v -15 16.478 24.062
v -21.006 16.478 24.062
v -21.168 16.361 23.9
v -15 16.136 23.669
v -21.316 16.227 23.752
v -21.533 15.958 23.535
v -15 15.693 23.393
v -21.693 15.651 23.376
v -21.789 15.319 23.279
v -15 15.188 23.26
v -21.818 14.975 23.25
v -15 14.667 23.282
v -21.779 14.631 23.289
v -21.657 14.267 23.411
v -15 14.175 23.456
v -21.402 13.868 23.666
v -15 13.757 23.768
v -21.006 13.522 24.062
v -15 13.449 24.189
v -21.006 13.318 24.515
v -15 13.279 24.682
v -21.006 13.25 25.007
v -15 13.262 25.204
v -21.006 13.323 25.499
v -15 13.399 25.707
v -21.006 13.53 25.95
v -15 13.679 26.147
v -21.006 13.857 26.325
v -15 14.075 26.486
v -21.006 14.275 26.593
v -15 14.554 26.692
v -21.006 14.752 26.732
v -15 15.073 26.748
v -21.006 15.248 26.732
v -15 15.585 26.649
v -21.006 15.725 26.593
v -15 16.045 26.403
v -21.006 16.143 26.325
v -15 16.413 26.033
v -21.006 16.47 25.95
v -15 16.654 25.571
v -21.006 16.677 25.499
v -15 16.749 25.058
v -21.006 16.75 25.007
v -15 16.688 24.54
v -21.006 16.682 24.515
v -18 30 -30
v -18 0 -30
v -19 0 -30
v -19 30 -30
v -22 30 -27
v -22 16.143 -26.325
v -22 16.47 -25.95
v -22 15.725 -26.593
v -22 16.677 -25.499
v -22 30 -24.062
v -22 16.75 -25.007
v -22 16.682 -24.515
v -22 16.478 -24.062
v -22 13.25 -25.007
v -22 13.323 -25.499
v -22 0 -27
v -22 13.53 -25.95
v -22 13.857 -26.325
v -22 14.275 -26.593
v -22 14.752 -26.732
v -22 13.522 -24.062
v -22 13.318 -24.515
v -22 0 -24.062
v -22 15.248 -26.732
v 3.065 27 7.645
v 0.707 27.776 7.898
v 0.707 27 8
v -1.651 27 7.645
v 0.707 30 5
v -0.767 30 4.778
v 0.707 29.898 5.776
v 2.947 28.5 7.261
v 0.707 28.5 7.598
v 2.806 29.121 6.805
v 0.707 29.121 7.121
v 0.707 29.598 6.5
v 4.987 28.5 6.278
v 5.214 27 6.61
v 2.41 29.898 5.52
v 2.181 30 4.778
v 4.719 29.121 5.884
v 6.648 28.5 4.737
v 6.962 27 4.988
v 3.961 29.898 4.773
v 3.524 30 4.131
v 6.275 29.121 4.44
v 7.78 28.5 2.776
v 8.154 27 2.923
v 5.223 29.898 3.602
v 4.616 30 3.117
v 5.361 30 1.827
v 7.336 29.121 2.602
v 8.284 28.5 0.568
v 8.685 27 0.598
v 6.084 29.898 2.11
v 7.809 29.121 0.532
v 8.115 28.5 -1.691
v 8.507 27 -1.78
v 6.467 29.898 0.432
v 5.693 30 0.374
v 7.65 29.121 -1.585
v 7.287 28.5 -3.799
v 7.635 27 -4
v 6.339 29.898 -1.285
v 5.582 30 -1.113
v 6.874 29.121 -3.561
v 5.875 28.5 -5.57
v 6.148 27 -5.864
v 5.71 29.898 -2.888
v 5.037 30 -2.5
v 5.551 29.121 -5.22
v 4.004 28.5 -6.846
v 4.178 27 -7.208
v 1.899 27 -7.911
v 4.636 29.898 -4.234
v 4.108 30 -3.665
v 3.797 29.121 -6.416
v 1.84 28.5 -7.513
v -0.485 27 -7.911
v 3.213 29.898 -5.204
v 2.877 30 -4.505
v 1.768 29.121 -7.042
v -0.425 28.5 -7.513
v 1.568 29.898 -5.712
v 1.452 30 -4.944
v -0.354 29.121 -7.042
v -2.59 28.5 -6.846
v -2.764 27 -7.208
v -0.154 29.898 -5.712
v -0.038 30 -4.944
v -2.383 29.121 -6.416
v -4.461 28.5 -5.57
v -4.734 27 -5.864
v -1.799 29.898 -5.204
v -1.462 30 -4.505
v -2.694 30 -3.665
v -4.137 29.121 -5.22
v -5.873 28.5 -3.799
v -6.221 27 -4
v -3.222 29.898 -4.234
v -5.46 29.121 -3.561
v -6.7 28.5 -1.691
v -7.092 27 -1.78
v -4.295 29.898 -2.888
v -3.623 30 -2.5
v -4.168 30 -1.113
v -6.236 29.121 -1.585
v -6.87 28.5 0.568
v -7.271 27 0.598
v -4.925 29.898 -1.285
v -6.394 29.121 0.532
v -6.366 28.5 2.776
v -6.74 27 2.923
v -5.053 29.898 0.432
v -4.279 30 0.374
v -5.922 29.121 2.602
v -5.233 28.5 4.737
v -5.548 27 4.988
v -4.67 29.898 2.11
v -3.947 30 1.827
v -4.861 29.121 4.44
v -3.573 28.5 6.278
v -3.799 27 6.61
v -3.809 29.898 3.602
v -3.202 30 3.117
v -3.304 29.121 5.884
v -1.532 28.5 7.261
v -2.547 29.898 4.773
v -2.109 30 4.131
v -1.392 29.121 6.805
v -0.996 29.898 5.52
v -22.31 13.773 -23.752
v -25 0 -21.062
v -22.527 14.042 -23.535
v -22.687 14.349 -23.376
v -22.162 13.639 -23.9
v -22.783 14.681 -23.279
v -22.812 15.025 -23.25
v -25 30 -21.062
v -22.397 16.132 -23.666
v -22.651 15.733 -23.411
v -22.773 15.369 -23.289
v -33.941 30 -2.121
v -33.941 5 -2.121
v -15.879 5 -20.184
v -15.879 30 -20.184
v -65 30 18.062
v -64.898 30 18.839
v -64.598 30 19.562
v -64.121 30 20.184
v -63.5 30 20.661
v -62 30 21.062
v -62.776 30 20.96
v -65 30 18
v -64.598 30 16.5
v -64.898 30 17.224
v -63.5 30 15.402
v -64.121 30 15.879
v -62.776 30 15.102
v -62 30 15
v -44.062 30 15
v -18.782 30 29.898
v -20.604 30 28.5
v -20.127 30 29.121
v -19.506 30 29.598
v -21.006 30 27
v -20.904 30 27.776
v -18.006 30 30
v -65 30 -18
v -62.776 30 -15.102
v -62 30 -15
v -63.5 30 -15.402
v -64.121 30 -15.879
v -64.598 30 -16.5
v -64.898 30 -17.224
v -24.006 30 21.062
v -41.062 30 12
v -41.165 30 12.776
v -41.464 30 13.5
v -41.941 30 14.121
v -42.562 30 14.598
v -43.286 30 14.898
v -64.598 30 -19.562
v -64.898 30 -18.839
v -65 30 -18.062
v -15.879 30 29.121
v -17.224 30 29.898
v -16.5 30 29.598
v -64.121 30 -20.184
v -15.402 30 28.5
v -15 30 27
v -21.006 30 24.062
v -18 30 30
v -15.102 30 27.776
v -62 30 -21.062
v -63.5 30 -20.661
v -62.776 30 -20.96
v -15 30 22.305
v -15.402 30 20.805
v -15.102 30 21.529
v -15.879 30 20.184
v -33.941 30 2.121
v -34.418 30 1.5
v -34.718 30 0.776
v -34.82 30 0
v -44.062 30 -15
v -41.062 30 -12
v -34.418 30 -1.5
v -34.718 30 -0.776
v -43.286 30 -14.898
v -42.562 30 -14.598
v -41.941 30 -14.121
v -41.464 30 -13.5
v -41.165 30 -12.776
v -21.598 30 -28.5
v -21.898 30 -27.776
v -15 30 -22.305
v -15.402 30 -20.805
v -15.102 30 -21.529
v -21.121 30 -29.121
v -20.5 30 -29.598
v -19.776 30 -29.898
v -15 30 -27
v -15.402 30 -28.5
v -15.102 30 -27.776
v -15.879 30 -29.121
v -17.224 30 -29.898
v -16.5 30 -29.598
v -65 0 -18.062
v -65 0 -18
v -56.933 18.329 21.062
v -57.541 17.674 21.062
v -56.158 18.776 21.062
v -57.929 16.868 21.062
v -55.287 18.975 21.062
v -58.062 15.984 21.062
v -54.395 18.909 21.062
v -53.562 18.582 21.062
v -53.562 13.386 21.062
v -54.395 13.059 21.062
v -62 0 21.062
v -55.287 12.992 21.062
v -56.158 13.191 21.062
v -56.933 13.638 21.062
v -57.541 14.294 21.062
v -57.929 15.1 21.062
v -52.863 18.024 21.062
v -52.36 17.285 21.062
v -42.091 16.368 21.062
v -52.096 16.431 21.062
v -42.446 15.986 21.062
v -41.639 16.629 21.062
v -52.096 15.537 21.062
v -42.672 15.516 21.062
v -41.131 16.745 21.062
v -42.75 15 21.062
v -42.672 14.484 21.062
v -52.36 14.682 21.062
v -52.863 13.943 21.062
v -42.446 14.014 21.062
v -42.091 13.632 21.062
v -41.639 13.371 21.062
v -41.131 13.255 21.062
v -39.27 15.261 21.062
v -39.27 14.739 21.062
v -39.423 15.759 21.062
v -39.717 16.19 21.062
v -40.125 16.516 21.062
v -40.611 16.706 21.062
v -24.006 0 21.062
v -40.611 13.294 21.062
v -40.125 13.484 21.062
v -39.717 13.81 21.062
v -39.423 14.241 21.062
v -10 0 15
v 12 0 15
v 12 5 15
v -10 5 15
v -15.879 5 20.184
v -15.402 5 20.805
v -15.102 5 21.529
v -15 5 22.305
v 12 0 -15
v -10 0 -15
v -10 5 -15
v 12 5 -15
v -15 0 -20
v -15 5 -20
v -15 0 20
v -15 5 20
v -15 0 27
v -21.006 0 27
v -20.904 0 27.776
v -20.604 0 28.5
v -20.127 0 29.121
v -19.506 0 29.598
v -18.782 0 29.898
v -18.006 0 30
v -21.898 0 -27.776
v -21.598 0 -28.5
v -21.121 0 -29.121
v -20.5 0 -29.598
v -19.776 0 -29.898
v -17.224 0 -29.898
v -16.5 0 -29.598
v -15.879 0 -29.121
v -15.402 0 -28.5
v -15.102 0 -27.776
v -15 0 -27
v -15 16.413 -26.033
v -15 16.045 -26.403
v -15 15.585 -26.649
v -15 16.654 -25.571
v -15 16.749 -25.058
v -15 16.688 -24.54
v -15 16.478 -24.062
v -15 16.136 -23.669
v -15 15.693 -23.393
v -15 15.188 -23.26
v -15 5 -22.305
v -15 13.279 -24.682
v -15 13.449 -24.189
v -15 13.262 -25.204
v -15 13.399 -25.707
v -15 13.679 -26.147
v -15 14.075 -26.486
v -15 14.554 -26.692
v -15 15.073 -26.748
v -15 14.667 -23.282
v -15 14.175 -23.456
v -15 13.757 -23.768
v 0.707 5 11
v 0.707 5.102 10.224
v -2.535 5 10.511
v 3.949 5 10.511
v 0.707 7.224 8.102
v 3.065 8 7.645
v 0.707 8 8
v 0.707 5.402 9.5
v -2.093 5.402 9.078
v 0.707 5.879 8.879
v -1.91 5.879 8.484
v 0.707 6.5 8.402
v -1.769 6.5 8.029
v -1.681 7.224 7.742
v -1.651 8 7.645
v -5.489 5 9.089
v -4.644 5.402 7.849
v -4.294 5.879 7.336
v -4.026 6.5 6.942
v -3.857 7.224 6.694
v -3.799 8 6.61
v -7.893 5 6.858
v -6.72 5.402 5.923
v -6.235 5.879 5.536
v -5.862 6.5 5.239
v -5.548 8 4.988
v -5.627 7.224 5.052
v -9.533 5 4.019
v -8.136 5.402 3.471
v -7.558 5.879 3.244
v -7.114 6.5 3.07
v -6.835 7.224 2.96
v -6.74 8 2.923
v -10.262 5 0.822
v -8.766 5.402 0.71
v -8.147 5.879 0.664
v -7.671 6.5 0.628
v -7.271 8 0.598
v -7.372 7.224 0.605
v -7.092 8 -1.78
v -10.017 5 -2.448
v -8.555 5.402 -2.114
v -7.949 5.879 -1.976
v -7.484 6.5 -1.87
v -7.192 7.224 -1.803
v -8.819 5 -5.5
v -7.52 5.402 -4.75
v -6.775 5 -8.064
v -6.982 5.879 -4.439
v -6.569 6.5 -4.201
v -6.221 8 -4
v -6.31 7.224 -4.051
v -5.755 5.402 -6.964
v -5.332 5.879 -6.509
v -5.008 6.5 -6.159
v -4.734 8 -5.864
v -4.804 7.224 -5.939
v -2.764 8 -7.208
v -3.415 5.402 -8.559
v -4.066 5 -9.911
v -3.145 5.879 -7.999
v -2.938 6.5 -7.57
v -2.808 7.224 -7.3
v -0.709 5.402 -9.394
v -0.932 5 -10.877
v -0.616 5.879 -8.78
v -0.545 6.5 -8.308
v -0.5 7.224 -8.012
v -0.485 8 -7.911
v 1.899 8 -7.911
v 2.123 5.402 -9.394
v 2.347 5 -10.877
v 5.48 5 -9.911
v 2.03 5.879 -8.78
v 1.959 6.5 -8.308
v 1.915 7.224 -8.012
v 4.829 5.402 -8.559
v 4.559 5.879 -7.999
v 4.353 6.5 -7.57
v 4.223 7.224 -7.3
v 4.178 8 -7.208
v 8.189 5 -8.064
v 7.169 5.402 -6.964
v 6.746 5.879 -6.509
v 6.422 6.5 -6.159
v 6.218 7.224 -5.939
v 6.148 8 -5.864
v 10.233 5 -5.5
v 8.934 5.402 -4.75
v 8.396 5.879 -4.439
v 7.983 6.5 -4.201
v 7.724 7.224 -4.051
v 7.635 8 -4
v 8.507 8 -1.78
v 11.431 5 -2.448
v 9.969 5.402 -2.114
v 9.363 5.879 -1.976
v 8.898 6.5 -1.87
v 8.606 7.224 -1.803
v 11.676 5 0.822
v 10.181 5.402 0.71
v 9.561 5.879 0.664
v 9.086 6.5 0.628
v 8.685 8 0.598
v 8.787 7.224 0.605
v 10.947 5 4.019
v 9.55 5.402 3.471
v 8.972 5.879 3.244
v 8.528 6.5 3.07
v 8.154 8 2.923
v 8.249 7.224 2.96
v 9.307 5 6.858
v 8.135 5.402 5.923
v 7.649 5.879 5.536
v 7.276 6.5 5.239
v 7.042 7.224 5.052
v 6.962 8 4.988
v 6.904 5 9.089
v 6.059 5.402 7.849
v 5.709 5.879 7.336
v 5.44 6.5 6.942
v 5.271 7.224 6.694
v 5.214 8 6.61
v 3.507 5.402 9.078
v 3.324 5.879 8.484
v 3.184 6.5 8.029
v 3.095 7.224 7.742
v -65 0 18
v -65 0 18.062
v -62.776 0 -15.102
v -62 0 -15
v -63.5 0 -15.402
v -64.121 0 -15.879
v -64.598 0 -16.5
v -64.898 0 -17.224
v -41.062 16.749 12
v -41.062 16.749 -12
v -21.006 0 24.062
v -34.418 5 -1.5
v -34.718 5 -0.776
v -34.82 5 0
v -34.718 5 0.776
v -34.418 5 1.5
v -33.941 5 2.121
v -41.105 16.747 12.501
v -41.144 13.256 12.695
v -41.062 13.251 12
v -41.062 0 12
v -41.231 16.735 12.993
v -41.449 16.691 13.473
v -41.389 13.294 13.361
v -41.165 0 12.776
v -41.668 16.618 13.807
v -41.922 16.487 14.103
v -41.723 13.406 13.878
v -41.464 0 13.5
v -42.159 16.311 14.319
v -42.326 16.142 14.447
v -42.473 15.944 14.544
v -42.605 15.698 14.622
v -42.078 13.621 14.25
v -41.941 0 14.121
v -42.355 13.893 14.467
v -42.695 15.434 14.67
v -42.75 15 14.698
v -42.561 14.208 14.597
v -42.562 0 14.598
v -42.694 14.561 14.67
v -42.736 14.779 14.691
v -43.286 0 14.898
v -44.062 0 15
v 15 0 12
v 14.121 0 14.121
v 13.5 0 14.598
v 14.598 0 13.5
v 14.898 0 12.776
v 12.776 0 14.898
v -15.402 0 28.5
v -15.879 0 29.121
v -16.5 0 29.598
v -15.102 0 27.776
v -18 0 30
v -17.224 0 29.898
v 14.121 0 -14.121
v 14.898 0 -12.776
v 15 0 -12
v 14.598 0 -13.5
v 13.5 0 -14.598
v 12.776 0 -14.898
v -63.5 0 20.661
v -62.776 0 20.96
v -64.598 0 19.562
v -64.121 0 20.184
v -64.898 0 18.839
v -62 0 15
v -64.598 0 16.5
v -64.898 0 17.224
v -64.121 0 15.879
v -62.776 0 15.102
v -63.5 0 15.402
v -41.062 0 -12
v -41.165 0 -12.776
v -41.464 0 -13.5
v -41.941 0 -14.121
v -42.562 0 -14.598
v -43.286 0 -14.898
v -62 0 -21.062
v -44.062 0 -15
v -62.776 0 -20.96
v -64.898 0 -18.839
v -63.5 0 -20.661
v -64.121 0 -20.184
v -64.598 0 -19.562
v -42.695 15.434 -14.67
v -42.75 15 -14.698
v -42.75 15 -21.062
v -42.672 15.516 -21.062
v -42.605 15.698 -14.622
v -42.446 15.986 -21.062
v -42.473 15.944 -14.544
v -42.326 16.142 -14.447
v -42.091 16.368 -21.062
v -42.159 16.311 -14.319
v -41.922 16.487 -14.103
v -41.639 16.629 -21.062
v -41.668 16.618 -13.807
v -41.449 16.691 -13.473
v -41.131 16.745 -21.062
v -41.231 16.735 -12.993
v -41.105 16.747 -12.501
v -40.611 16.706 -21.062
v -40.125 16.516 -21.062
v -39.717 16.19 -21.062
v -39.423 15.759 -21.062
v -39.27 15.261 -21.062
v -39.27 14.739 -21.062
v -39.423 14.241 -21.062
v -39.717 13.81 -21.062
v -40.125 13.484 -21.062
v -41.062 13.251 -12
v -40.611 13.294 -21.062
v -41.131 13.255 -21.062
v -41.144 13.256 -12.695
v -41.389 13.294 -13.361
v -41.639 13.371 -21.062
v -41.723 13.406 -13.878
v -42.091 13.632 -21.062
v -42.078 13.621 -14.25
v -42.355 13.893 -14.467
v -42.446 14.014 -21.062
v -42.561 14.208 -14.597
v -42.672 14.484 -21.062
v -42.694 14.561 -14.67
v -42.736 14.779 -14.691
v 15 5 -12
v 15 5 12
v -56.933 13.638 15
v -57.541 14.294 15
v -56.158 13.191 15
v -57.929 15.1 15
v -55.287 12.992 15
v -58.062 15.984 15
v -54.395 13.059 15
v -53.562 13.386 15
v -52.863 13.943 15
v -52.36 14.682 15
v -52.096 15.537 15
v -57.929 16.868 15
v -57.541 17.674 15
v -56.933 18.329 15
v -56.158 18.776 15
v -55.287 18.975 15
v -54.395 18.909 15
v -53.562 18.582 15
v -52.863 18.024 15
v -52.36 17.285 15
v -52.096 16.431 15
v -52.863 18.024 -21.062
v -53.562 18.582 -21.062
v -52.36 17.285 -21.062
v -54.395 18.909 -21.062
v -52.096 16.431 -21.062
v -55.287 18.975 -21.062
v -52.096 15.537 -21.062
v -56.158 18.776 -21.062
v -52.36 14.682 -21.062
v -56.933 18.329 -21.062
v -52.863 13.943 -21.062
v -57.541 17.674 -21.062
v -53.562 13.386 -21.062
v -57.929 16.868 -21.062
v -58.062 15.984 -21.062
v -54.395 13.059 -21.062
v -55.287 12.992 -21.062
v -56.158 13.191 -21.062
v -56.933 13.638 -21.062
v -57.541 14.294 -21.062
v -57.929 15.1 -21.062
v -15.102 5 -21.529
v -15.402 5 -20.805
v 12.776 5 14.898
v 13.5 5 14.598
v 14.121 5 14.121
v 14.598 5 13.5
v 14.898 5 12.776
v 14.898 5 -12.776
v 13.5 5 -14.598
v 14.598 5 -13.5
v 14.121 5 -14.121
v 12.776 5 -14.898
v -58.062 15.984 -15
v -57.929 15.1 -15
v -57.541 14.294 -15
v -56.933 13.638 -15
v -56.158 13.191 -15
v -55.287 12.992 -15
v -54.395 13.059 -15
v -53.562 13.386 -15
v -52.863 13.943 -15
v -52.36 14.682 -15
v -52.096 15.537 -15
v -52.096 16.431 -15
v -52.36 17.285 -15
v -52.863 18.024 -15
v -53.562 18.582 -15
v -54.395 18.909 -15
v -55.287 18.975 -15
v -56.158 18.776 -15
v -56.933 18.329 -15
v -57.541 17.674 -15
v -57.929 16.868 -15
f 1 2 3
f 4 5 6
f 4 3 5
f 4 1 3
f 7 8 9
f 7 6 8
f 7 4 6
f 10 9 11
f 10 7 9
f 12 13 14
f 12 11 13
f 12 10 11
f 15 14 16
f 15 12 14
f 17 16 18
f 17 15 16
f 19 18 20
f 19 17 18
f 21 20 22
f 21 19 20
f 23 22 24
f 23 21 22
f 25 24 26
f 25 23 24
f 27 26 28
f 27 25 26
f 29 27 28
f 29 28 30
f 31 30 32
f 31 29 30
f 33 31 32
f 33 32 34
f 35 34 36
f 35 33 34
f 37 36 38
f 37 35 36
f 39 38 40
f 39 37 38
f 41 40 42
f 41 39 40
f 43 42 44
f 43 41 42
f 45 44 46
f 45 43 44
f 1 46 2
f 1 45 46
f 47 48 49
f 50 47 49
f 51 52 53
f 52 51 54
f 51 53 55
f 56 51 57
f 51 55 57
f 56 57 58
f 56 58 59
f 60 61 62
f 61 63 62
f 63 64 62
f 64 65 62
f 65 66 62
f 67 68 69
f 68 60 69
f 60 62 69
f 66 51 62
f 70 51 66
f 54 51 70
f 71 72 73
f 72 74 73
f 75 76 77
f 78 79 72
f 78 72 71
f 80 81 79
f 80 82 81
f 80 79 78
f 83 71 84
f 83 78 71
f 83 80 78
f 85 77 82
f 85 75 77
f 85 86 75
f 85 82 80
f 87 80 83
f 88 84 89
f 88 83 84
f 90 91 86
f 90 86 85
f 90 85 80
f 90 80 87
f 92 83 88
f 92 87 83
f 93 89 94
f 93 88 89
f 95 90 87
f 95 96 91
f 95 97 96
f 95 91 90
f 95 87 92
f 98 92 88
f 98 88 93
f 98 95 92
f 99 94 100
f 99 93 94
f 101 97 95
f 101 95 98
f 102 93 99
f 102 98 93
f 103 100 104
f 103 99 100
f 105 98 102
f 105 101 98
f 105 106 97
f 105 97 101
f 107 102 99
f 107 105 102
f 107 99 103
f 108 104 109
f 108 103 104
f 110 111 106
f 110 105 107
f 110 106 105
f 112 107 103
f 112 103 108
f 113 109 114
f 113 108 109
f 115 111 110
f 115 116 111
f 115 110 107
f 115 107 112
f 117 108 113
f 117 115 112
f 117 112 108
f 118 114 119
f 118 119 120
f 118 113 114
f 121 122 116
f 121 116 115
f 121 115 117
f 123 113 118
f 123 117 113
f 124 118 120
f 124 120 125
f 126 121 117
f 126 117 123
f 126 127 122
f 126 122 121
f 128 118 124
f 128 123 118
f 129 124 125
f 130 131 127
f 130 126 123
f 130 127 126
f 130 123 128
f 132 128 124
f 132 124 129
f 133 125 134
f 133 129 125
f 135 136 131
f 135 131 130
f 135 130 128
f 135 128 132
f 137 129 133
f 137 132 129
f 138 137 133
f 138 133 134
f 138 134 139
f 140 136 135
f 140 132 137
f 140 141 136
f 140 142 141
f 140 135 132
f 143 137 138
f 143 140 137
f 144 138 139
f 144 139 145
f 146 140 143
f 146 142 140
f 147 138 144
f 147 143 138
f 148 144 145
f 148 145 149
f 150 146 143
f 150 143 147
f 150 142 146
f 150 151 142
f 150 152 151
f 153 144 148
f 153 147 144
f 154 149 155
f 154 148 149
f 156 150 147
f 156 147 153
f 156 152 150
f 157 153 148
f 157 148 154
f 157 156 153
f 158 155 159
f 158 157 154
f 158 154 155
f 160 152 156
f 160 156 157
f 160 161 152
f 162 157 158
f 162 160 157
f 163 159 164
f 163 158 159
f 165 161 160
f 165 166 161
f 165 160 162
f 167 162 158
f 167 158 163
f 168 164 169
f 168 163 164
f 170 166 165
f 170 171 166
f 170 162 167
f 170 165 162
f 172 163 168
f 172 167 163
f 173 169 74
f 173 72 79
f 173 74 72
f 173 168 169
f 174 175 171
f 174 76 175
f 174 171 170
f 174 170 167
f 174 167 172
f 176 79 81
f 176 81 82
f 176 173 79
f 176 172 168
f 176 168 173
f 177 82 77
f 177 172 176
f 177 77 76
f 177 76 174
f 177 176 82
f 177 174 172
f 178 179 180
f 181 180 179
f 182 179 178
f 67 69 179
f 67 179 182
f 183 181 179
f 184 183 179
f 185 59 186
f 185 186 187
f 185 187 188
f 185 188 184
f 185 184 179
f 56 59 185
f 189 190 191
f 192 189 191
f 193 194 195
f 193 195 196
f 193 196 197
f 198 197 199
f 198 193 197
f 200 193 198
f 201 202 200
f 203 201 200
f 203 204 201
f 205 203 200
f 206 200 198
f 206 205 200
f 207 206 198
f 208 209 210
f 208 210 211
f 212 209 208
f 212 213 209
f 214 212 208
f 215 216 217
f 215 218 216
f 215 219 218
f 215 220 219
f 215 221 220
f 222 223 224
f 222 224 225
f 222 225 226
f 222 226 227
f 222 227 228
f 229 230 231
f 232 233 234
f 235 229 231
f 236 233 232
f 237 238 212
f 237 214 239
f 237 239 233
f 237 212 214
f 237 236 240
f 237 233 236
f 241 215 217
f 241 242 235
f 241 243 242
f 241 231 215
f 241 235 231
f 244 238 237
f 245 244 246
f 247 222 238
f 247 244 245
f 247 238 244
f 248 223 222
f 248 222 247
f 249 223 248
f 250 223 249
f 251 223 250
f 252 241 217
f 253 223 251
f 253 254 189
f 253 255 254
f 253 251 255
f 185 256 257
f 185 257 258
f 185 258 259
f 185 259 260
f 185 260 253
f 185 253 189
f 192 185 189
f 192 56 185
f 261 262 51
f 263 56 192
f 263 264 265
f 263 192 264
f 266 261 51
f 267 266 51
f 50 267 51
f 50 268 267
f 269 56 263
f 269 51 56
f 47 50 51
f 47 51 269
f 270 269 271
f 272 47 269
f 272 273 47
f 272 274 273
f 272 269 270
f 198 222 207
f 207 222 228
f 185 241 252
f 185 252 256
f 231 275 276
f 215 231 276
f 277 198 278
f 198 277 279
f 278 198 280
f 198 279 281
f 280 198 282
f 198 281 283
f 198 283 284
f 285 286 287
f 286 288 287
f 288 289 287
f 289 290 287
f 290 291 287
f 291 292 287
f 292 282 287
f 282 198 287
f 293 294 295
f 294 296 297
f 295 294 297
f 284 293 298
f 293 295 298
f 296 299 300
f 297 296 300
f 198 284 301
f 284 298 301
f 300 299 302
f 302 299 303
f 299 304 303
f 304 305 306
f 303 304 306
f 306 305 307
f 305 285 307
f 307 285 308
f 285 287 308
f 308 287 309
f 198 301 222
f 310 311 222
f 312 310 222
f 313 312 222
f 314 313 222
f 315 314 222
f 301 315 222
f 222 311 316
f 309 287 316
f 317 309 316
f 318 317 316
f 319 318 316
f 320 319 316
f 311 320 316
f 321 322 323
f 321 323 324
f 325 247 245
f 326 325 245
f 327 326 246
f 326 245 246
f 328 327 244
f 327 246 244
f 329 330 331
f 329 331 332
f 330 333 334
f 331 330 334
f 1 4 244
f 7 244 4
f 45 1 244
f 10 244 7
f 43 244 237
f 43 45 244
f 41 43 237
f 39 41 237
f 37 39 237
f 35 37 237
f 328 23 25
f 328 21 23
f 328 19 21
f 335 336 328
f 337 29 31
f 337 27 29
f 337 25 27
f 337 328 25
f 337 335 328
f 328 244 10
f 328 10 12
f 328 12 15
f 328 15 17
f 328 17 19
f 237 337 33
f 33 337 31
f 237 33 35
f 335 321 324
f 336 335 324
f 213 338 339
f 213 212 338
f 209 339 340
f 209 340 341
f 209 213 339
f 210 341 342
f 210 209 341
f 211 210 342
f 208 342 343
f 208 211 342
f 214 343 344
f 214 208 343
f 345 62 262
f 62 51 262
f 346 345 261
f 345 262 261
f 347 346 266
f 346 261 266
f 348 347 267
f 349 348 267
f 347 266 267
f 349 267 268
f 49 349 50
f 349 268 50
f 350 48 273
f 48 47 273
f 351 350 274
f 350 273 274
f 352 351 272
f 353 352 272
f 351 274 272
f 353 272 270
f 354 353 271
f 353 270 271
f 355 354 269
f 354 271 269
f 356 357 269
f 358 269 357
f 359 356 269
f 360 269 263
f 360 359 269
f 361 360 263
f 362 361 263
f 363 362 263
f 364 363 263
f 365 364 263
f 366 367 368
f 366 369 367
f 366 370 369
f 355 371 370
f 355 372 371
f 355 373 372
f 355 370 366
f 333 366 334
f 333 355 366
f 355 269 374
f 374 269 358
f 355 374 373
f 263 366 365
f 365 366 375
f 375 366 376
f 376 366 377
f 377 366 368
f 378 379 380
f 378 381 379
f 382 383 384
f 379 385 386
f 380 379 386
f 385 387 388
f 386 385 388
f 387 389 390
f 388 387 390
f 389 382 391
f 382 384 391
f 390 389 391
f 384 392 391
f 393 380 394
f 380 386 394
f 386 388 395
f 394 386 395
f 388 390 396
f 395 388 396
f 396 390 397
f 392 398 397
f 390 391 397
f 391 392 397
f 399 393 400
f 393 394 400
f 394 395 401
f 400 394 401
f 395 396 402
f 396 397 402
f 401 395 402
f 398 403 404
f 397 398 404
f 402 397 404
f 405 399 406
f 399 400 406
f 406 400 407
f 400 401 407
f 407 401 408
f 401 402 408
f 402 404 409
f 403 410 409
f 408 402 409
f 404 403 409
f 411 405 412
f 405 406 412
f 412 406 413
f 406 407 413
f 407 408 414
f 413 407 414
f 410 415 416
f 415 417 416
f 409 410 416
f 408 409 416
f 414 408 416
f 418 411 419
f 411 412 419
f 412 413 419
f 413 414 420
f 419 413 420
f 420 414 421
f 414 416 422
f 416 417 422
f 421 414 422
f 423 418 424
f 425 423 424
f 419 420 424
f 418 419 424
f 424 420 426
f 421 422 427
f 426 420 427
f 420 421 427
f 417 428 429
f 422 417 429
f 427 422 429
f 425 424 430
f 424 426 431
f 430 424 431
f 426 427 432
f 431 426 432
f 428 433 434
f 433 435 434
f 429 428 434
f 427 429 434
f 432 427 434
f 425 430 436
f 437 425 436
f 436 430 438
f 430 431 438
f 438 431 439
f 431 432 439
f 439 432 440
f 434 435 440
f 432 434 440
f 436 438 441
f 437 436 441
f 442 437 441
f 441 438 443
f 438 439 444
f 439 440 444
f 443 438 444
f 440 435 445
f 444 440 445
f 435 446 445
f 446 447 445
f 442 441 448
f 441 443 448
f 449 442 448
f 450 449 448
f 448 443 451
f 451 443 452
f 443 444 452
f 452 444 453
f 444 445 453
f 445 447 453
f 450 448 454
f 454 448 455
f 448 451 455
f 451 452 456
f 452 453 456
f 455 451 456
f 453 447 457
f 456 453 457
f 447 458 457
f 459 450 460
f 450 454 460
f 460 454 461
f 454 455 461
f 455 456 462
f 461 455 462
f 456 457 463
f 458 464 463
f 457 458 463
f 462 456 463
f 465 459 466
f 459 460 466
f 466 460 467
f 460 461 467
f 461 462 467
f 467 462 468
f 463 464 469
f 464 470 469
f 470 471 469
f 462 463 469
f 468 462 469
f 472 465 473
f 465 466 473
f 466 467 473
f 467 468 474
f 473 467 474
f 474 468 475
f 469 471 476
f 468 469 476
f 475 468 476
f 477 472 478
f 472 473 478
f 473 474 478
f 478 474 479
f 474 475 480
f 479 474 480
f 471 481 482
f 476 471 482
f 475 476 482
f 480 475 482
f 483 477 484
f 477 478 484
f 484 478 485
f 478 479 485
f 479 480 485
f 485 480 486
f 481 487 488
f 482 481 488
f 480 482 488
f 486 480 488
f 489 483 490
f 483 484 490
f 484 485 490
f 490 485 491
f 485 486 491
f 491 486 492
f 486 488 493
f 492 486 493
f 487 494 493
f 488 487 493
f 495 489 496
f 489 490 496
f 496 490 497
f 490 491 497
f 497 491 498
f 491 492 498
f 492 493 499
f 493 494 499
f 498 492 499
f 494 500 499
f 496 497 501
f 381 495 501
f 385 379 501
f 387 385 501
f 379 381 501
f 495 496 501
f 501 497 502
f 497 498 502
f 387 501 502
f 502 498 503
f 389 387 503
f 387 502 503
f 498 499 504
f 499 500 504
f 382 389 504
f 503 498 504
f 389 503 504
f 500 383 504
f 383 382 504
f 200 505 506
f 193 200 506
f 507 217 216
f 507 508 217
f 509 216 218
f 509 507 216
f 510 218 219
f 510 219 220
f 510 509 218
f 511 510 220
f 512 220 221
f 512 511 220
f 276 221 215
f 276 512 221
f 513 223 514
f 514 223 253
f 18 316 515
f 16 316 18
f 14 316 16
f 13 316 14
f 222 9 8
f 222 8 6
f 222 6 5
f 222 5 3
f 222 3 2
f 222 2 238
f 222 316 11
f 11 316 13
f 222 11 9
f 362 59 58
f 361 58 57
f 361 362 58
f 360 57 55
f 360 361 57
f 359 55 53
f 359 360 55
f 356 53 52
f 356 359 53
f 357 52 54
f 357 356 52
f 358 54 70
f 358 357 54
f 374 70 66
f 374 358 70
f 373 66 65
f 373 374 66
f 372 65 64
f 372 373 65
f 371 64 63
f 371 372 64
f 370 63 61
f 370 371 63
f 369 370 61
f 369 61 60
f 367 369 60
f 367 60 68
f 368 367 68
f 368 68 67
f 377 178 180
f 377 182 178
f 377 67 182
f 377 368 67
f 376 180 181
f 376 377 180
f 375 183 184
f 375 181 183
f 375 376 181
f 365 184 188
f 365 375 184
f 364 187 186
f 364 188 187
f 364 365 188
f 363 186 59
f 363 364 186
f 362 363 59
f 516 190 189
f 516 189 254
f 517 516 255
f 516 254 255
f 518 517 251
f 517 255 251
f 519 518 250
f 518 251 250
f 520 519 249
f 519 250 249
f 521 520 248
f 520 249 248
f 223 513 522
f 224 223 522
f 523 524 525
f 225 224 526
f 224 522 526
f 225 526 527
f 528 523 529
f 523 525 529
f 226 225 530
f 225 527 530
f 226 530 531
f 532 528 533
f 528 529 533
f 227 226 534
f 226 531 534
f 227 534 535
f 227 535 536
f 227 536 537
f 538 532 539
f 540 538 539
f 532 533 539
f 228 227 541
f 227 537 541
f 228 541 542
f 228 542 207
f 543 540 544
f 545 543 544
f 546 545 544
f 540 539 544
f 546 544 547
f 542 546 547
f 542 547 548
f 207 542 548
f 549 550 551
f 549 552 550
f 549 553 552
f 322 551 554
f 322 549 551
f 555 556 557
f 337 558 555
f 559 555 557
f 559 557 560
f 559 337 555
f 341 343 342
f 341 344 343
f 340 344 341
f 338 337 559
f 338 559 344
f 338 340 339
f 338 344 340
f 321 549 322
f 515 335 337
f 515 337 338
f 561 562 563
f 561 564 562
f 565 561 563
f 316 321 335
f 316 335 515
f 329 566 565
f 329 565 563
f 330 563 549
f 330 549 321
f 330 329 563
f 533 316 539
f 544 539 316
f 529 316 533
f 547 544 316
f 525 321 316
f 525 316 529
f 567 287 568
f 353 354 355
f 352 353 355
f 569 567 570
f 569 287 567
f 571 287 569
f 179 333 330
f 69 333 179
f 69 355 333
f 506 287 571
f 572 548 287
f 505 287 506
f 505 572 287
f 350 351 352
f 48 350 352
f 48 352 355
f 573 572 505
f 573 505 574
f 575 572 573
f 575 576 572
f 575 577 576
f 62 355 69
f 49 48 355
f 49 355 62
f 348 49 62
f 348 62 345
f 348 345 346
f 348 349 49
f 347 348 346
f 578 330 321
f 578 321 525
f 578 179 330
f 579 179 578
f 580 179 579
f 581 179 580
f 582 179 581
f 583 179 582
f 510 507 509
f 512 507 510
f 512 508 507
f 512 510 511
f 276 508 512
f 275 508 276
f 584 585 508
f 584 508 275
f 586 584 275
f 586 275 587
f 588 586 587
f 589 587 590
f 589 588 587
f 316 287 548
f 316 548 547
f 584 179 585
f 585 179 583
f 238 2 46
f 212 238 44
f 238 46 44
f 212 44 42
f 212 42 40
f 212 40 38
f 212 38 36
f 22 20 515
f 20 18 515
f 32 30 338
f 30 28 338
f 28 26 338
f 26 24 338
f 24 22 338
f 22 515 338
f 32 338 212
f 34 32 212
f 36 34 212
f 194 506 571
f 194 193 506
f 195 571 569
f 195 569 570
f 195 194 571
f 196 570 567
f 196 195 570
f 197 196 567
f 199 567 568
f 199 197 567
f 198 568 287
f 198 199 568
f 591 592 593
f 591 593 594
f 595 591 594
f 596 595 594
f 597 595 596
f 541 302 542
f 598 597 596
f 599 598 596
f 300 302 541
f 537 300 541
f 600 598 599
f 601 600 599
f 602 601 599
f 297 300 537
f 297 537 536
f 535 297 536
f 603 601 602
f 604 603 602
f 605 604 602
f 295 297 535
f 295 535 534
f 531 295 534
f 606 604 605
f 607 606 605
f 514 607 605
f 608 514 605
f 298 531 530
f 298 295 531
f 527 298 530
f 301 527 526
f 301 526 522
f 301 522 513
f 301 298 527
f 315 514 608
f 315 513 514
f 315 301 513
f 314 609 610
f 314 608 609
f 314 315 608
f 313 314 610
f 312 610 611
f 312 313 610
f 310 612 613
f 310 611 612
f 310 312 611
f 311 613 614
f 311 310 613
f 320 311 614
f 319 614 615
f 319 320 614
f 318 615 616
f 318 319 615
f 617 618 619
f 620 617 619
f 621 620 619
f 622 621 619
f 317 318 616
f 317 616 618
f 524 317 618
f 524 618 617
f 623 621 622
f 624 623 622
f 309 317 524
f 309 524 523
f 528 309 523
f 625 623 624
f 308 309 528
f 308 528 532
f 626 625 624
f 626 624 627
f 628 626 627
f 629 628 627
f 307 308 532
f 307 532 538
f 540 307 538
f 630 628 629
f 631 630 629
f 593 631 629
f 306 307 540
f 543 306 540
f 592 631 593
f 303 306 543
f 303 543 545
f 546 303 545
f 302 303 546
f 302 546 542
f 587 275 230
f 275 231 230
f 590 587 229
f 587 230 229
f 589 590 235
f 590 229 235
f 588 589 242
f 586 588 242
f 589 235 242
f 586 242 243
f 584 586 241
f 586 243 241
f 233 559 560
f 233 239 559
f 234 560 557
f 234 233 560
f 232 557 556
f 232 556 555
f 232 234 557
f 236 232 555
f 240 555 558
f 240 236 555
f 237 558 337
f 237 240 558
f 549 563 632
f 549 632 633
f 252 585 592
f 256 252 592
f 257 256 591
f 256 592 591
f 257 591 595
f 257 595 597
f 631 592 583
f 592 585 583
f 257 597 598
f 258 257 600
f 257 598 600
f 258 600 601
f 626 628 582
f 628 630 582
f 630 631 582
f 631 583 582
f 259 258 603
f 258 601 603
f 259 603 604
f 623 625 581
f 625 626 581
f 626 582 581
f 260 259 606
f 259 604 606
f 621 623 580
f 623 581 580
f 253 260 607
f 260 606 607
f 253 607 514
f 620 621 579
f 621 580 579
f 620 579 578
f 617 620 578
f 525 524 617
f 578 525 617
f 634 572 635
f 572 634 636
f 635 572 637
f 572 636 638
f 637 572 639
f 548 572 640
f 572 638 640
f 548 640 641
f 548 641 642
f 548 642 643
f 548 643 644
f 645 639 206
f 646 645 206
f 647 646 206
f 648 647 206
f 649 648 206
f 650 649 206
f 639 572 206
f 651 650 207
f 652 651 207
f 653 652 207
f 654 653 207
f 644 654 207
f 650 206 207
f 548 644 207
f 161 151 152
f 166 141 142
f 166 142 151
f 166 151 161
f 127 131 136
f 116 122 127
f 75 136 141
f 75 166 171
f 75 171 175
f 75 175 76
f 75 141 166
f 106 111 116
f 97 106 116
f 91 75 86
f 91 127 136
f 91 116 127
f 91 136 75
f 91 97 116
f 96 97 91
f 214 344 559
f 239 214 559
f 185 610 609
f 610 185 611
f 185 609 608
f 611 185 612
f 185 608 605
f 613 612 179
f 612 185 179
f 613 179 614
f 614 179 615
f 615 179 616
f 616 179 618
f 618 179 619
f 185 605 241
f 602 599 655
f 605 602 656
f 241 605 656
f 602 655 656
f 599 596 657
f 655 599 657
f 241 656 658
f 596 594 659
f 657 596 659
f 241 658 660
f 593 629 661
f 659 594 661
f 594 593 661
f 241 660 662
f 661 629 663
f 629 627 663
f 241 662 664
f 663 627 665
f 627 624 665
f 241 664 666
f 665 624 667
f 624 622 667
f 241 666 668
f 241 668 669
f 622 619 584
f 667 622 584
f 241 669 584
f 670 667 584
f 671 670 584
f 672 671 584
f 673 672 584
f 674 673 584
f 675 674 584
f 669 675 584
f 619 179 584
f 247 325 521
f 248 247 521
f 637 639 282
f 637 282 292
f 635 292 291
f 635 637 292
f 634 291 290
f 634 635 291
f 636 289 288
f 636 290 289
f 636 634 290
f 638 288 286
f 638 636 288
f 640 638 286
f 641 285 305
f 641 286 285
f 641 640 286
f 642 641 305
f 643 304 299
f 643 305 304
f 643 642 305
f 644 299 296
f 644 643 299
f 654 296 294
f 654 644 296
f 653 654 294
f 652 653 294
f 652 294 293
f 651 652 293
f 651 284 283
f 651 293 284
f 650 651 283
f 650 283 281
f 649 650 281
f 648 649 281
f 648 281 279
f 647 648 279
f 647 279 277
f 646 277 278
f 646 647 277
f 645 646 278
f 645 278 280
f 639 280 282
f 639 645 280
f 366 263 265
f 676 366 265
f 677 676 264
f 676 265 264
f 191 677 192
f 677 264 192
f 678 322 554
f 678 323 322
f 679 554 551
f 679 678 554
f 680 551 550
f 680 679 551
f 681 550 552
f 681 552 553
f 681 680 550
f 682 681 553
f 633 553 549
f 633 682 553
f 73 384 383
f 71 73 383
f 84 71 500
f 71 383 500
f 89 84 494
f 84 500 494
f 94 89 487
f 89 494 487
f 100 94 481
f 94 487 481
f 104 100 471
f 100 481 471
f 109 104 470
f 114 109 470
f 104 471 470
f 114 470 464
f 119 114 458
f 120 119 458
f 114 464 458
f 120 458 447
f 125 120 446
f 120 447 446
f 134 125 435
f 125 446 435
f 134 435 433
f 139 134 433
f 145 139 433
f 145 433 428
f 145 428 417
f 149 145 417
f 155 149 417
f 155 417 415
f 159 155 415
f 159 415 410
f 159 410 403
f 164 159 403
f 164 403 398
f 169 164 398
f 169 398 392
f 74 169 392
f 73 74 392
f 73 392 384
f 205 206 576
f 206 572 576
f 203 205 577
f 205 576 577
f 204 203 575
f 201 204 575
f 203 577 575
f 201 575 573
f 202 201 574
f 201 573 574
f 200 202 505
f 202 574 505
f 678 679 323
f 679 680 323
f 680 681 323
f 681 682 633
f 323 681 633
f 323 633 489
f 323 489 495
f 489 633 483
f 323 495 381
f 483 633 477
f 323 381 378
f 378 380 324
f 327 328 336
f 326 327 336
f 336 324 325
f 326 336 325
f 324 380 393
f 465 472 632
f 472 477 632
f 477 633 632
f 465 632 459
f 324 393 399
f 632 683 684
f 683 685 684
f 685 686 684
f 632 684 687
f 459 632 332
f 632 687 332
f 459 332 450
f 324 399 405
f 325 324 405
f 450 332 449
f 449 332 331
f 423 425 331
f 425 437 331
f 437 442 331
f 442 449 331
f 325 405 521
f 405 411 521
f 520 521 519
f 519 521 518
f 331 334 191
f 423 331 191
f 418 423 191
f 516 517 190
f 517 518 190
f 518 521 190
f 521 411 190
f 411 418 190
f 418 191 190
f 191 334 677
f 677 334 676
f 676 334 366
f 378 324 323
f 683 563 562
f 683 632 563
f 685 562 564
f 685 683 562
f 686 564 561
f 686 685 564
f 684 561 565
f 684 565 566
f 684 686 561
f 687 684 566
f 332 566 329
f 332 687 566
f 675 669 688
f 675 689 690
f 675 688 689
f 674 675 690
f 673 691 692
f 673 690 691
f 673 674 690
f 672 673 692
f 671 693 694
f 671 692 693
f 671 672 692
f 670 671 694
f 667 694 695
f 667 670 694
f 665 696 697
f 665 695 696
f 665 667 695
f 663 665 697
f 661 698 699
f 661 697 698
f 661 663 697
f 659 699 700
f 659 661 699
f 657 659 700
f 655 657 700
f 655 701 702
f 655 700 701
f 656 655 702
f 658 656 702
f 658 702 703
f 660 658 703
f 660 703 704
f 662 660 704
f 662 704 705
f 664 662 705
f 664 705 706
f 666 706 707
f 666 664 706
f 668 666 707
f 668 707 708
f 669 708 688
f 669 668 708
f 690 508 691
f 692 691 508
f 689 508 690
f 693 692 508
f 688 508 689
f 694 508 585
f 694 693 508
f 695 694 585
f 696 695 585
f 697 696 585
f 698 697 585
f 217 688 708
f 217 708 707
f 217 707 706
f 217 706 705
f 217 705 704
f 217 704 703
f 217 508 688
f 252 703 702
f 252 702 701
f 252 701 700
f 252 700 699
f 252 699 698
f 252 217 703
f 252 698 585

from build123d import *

# Parameters (mm, degrees)
SKETCH1_R               = 8
BOSS_EXTRUDE1_DEPTH     = 30
BOSS_EXTRUDE1_2_DEPTH   = 30
SKETCH2_W               = 30
SKETCH2_H               = 30
CUT_EXTRUDE1_DEPTH      = 30
CHAMFER1_SIZE           = 3
FILLET1_R               = 3
FILLET2_R               = 3
CUT_EXTRUDE2_DEPTH      = 30
CUT_EXTRUDE2_DEPTH_BACK = 30
SKETCH3_R               = 1.75
CUT_EXTRUDE3_DEPTH      = 50
CUT_EXTRUDE3_DEPTH_BACK = 30
SKETCH4_R               = 3
CUT_EXTRUDE4_DEPTH      = 88.933914818
CUT_EXTRUDE4_DEPTH_BACK = 88.933914818
SKETCH5_R               = 1.75
BOSS_EXTRUDE2_DEPTH     = 5
FILLET3_R               = 3
FILLET4_R               = 3
FILLET5_R               = 3
CHAMFER5_SIZE           = 5


with BuildPart() as part:
    # Sketch1 → Boss-Extrude1 (new body)
    with BuildSketch(Plane(origin=(0, 0, 0), x_dir=(1, 0, 0), z_dir=(0, 1, 0))):
        with Locations(Location((0.707106781, 0, 0), (0, 0, 270))):
            Circle(SKETCH1_R)
    extrude(amount=BOSS_EXTRUDE1_DEPTH)



with BuildPart() as body_2:
    # Sketch1 → Boss-Extrude1 2 (new body)
    with BuildSketch(Plane(origin=(0, 0, 0), x_dir=(1, 0, 0), z_dir=(0, 1, 0))):
        Polygon((-65, 21.062445841), (-65, -21.062445841), (-21.005807434, -21.062445841), (-21.005807434, -30), (-15, -30), (-15, -21.062445841), (-36.062445841, 0), (-15, 21.062445841), (-15, 30), (-22, 30), (-22, 21.062445841), align=None)
    extrude(amount=BOSS_EXTRUDE1_2_DEPTH)

    # Sketch2 → Cut-Extrude1 (cut)
    with BuildSketch(Plane(origin=(0, 30, 0), x_dir=(1, 0, 0), z_dir=(0, 1, 0))):
        with Locations((-56.062445841, 0)):
            Rectangle(SKETCH2_W, SKETCH2_H)
    extrude(amount=-CUT_EXTRUDE1_DEPTH, mode=Mode.SUBTRACT)

    # Chamfer1
    chamfer1_edges = [body_2.edges().sort_by_distance(p)[0] for p in [
        (-21.005807434, 15, 21.062445841),
        (-22, 15, -21.062445841),
    ]]
    chamfer(chamfer1_edges, length=CHAMFER1_SIZE)

    # Fillet1
    fillet1_edges = [body_2.edges().sort_by_distance(p)[0] for p in [
        (-36.062445841, 15, 0),
        (-15, 15, 21.062445841),
        (-15, 15, -21.062445841),
        (-41.062445841, 15, 15),
        (-41.062445841, 15, -15),
    ]]
    fillet(fillet1_edges, radius=FILLET1_R)

    # Fillet2
    fillet2_edges = [body_2.edges().sort_by_distance(p)[0] for p in [
        (-15, 15, 30),
        (-21.005807434, 15, 30),
        (-65, 15, 21.062445841),
        (-65, 15, -21.062445841),
        (-22, 15, -30),
        (-15, 15, -30),
        (-65, 15, 15),
        (-65, 15, -15),
    ]]
    fillet(fillet2_edges, radius=FILLET2_R)

    # Sketch3 → Cut-Extrude2 (cut, two sides: drawn at the far end of the back side and taken through both)
    with BuildSketch(Plane.ZY.offset(22).offset(-CUT_EXTRUDE2_DEPTH_BACK)):
        with Locations(Location((-25, 15, 0), (0, 0, 57.605534529))):
            Circle(SKETCH3_R)
        with Locations(Location((25, 15, 0), (0, 0, 122.394465471))):
            Circle(SKETCH3_R)
    extrude(amount=CUT_EXTRUDE2_DEPTH + CUT_EXTRUDE2_DEPTH_BACK, mode=Mode.SUBTRACT)

    # Sketch4 → Cut-Extrude3 (cut, two sides: drawn at the far end of the back side and taken through both)
    with BuildSketch(Plane.XY.offset(-15).offset(-CUT_EXTRUDE3_DEPTH_BACK)):
        with Locations(Location((-55.062445841, 15.983841749, 0), (0, 0, 180))):
            Circle(SKETCH4_R)
    extrude(amount=CUT_EXTRUDE3_DEPTH + CUT_EXTRUDE3_DEPTH_BACK, mode=Mode.SUBTRACT)

    # Sketch5 → Cut-Extrude4 (cut, two sides: drawn at the far end of the back side and taken through both)
    with BuildSketch(Plane(origin=(0, 0, -21.062445841), x_dir=(-1, 0, 0), z_dir=(0, 0, -1)).offset(-CUT_EXTRUDE4_DEPTH_BACK)):
        with Locations((41, 15)):
            Circle(SKETCH5_R)
    extrude(amount=CUT_EXTRUDE4_DEPTH + CUT_EXTRUDE4_DEPTH_BACK, mode=Mode.SUBTRACT)


with BuildPart() as part_1:
    add(part.part)

    add(body_2.part)  # Boss-Extrude2 merges body 2
    # Sketch6 → Boss-Extrude2 (add)
    with BuildSketch(Plane(origin=(0, 0, 0), x_dir=(1, 0, 0), z_dir=(0, 1, 0))):
        Polygon((-15, 15), (15, 15), (15, -15), (-15, -15), (-15, -24.652543264), (-37.297750688, -1.415722551), (-37.297750688, 2.803501212), (-15, 23.928760824), align=None)
    extrude(amount=BOSS_EXTRUDE2_DEPTH)

    # Fillet3
    fillet3_edges = [part_1.edges().sort_by_distance(p)[0] for p in [
        (0.707106781, 30, -8),
    ]]
    fillet(fillet3_edges, radius=FILLET3_R)

    # Fillet4
    fillet4_edges = [part_1.edges().sort_by_distance(p)[0] for p in [
        (15, 2.5, 15),
        (15, 2.5, -15),
    ]]
    fillet(fillet4_edges, radius=FILLET4_R)

    # Fillet5
    fillet5_edges = [part_1.edges().sort_by_distance(p)[0] for p in [
        (0.707106781, 5, -8),
    ]]
    fillet(fillet5_edges, radius=FILLET5_R)

    # Chamfer5
    chamfer5_edges = [part_1.edges().sort_by_distance(p)[0] for p in [
        (-15, 2.5, -15),
        (-15, 2.5, 15),
    ]]
    chamfer(chamfer5_edges, length=CHAMFER5_SIZE)


solid = part_1.part
